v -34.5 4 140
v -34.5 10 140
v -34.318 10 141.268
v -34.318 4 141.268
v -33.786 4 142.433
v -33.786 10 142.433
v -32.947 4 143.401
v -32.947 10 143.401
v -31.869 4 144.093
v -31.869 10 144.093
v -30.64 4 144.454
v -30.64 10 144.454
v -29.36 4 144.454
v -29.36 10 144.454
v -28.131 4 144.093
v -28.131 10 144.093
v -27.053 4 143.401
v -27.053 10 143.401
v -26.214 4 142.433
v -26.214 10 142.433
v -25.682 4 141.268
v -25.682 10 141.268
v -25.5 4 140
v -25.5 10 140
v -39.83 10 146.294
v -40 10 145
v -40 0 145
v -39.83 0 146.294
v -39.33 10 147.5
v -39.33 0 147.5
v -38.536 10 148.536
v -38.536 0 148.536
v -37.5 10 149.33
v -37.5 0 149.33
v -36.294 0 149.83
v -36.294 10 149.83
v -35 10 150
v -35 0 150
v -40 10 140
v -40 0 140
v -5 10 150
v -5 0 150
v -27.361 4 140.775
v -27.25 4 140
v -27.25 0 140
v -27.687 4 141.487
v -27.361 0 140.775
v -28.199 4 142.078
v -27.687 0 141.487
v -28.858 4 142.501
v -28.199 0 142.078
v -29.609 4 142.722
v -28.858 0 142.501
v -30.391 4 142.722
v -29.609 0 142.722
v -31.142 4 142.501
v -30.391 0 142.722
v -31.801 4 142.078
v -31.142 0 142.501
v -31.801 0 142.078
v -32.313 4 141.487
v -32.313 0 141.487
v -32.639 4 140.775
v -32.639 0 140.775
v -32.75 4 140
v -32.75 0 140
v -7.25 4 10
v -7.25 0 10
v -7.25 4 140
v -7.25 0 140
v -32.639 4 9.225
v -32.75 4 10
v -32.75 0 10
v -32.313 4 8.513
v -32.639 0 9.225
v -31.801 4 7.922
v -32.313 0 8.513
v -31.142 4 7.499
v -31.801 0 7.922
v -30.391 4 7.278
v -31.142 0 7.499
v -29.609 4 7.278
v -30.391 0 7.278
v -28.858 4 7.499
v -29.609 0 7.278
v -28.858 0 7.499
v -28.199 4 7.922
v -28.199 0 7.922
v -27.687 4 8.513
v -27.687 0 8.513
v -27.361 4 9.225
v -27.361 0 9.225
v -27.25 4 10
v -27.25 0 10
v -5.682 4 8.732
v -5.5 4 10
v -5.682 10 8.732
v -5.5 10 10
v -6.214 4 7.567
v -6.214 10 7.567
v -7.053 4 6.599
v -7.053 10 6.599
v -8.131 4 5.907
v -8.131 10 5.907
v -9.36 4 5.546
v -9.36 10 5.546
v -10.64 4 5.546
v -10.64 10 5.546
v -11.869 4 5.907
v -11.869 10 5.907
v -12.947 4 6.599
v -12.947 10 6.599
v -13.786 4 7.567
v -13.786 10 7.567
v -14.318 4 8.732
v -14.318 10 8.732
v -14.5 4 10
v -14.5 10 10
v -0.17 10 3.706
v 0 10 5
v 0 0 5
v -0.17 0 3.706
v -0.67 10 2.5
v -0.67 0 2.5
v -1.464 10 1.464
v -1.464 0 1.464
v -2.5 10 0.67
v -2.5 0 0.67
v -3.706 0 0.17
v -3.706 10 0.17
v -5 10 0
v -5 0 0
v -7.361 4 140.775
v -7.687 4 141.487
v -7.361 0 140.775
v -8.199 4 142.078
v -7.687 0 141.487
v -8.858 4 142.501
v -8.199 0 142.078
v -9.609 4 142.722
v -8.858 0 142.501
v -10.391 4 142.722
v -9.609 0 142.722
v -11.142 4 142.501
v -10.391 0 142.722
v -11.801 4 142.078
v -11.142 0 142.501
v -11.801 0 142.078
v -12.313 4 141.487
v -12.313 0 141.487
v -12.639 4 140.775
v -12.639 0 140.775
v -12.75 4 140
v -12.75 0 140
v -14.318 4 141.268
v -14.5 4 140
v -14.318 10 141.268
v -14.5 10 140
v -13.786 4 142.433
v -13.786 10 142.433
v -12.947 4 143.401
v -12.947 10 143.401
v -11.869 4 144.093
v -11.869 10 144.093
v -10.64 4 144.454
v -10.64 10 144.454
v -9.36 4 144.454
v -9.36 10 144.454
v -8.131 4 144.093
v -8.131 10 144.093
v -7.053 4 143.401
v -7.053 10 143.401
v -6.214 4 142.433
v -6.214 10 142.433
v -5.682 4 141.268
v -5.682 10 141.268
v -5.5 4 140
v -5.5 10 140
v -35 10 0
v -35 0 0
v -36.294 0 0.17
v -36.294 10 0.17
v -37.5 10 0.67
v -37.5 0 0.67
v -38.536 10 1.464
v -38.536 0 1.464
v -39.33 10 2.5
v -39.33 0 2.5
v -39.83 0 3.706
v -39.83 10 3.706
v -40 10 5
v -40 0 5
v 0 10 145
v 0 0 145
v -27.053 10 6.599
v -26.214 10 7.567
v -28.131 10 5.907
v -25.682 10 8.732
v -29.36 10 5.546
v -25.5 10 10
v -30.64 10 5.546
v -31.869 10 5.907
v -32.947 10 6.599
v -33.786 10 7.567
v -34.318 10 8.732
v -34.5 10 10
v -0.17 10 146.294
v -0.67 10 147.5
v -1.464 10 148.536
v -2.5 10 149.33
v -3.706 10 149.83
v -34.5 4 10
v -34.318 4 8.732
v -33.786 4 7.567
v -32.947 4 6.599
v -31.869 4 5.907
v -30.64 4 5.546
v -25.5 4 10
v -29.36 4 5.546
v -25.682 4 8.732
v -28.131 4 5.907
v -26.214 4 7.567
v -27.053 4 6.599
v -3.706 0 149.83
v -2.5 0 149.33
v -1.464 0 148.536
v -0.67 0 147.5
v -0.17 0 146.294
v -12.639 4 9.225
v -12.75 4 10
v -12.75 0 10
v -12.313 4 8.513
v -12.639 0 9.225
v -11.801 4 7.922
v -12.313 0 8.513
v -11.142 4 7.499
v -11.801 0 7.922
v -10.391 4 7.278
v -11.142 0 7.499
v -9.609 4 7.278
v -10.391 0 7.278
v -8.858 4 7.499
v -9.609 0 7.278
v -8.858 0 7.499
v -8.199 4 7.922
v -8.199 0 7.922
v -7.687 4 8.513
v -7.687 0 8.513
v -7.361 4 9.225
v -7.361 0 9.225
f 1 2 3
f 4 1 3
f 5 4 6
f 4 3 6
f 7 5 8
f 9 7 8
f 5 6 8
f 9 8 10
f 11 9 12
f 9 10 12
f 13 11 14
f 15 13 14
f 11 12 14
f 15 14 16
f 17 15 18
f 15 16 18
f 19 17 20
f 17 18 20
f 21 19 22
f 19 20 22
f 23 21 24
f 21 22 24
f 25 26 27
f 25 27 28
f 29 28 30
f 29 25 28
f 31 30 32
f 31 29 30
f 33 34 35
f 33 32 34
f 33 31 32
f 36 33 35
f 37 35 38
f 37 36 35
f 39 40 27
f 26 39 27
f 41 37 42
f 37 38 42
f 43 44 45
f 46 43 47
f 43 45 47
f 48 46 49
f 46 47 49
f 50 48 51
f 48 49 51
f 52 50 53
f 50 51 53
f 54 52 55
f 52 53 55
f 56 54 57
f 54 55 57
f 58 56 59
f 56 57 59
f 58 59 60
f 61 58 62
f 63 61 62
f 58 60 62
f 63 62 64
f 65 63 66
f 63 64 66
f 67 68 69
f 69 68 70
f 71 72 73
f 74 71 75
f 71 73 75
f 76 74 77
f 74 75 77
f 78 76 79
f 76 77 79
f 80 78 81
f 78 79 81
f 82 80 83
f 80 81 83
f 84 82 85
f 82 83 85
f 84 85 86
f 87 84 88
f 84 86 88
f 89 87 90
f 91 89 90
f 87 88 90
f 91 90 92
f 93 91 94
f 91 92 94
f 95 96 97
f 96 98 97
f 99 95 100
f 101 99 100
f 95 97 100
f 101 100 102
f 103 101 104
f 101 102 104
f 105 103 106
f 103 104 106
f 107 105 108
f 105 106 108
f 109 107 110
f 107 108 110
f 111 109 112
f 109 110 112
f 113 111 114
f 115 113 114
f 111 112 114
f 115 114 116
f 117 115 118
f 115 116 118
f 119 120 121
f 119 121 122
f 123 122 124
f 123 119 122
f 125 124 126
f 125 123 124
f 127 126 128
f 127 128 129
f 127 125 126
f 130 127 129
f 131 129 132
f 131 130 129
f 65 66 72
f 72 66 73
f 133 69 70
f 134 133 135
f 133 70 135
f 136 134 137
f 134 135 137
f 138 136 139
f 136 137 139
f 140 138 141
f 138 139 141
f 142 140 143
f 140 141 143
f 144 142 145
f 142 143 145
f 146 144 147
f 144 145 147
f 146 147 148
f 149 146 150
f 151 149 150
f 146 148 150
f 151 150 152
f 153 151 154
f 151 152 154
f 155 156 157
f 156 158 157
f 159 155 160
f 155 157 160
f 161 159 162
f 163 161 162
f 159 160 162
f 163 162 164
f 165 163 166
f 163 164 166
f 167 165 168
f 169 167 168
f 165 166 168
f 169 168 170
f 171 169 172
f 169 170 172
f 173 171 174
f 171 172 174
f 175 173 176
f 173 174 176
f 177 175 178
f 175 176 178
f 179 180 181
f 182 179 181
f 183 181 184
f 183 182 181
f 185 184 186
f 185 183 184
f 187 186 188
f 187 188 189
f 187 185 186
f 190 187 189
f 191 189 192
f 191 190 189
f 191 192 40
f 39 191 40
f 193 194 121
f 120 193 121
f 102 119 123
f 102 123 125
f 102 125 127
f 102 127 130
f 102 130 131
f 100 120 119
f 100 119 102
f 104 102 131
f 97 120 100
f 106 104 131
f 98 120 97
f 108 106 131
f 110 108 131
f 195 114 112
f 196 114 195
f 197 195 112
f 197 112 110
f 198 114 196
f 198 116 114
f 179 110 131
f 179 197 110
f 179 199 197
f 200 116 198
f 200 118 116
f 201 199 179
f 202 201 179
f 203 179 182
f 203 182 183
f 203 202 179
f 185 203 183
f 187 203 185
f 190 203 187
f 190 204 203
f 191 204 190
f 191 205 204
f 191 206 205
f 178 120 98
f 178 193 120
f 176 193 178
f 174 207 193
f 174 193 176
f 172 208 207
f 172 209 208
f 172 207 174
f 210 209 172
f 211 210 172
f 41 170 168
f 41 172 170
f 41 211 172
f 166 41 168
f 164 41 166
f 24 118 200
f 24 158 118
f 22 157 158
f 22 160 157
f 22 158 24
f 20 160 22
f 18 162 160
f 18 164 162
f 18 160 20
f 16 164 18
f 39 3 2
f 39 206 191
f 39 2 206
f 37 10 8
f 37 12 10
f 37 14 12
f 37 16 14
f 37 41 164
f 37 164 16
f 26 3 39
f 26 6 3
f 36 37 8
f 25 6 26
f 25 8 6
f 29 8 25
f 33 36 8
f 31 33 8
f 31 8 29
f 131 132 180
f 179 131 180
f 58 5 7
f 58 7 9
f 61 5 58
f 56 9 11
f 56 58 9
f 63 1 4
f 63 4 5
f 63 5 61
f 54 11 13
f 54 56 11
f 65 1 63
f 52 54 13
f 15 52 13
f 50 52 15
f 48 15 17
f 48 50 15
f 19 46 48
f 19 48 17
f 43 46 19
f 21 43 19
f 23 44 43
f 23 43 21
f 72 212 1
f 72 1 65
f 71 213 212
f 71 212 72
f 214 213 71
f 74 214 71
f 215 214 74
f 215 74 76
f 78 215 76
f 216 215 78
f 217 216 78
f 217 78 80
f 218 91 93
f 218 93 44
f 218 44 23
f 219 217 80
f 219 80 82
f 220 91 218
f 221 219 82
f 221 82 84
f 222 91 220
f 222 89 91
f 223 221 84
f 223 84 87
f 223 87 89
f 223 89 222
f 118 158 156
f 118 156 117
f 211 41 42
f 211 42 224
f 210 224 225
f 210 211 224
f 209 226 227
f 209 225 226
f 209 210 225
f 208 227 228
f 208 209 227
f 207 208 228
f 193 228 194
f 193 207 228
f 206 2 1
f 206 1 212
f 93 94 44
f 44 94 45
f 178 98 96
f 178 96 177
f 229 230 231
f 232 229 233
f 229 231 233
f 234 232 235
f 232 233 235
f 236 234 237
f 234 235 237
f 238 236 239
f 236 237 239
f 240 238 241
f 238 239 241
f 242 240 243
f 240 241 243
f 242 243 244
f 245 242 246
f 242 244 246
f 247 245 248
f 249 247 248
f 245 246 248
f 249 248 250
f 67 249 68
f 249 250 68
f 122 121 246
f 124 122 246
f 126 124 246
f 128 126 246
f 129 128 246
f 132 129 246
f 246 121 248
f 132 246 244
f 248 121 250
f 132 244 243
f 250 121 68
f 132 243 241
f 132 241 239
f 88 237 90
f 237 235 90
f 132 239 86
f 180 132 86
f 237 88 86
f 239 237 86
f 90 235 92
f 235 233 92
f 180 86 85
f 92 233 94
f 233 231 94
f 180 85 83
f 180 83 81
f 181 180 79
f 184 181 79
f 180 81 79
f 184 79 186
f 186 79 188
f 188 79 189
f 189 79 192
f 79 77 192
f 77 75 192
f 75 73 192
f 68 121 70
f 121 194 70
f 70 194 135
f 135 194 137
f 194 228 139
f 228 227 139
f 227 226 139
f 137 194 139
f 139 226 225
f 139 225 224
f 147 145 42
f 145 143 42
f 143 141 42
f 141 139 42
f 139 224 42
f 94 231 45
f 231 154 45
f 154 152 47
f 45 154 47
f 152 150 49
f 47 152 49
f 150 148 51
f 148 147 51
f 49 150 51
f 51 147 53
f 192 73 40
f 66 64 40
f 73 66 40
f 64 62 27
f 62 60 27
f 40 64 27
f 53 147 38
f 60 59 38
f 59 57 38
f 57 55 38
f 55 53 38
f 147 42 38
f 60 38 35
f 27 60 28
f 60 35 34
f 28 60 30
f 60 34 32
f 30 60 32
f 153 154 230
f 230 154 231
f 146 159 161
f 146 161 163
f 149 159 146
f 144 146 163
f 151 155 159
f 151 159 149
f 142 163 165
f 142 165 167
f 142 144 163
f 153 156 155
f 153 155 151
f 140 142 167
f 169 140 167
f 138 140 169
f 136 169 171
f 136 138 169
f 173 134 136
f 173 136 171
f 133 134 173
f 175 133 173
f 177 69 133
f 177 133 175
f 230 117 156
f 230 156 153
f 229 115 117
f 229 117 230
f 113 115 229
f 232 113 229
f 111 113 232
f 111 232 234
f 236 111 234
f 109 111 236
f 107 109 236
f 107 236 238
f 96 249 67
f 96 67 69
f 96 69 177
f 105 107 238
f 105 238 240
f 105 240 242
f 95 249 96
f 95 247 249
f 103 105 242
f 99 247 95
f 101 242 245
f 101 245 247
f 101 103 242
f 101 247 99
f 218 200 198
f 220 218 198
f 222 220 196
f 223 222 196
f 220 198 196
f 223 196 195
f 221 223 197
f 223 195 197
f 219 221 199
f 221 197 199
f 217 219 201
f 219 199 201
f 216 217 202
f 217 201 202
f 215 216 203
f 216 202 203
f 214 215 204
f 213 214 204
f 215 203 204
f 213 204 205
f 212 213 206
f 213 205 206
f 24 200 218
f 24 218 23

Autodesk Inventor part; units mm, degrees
ref_plane "YZ Plane" through (0, 0, 0) normal (1, 0, 0) x (0, 1, 0)
ref_plane "XZ Plane" through (0, 0, 0) normal (0, 1, 0) x (-1, 0, 0)
ref_plane "XY Plane" through (0, 0, 0) normal (0, 0, 1) x (1, 0, 0)
sketch "Sketch5" plane through (0, 0, 0) normal (0, 1, 0) x (-1, 0, 0)
  line L0 (0, 0) -> (40, 0)
  line L1 (40, 0) -> (40, 150)
  line L2 (40, 150) -> (0, 150)
  line L3 (0, 150) -> (0, 0)
  line L4 (40, 150) -> (40, 140)
  line L5 (40, 140) -> (30, 140)
  circle A0 centre (30, 140) radius 2.75
  circle A1 centre (30, 10) radius 2.75
  circle A2 centre (10, 140) radius 2.75
  circle A3 centre (10, 10) radius 2.75
  line L6 (32.75, 140) -> (32.75, 10)
  line L7 (27.25, 10) -> (27.25, 140)
  line L8 (12.75, 140) -> (12.75, 10)
  line L9 (7.25, 10) -> (7.25, 140)
  dimension "d107" = 40
  dimension "d108" = 150
  dimension "d109" = 10
  dimension "d110" = 10
  dimension "d111" = 5.5
  dimension "d114" = 130
  dimension "d117" = 20
extrude "Extrusion3" add sketch "Sketch5" along normal blind 10
sketch "Sketch6" plane through (0, 10, 0) normal (0, 1, 0) x (1, 0, 0)
  arc A0 (-32.75, -140) -> (-27.25, -140) centre (-30, -140) ccw projected
  circle A1 centre (-30, -140) radius 4.5
  arc A2 (-27.25, -10) -> (-32.75, -10) centre (-30, -10) ccw projected
  circle A3 centre (-30, -10) radius 4.5
  arc A4 (-7.25, -10) -> (-12.75, -10) centre (-10, -10) ccw projected
  circle A5 centre (-10, -10) radius 4.5
  circle A6 centre (-10, -140) radius 4.5
  line L0 (-34.5, -140) -> (-34.5, -10)
  line L1 (-25.5, -10) -> (-25.5, -140)
  line L2 (-14.5, -140) -> (-14.5, -10)
  line L3 (-5.5, -10) -> (-5.5, -140)
  point P0 (0, 0)
  dimension "d122" = 9
  dimension "d123" = 9
  dimension "d124" = 9
  dimension "d125" = 9
extrude "Extrusion4" cut sketch "Sketch6" against normal blind 6
fillet "Fillet2" radius 5 4 edges at (0, 5, 150) (-40, 5, 150) (0, 5, 0) (-40, 5, 0)
properties part number "GARFO" material "Aluminium AW-7020"
